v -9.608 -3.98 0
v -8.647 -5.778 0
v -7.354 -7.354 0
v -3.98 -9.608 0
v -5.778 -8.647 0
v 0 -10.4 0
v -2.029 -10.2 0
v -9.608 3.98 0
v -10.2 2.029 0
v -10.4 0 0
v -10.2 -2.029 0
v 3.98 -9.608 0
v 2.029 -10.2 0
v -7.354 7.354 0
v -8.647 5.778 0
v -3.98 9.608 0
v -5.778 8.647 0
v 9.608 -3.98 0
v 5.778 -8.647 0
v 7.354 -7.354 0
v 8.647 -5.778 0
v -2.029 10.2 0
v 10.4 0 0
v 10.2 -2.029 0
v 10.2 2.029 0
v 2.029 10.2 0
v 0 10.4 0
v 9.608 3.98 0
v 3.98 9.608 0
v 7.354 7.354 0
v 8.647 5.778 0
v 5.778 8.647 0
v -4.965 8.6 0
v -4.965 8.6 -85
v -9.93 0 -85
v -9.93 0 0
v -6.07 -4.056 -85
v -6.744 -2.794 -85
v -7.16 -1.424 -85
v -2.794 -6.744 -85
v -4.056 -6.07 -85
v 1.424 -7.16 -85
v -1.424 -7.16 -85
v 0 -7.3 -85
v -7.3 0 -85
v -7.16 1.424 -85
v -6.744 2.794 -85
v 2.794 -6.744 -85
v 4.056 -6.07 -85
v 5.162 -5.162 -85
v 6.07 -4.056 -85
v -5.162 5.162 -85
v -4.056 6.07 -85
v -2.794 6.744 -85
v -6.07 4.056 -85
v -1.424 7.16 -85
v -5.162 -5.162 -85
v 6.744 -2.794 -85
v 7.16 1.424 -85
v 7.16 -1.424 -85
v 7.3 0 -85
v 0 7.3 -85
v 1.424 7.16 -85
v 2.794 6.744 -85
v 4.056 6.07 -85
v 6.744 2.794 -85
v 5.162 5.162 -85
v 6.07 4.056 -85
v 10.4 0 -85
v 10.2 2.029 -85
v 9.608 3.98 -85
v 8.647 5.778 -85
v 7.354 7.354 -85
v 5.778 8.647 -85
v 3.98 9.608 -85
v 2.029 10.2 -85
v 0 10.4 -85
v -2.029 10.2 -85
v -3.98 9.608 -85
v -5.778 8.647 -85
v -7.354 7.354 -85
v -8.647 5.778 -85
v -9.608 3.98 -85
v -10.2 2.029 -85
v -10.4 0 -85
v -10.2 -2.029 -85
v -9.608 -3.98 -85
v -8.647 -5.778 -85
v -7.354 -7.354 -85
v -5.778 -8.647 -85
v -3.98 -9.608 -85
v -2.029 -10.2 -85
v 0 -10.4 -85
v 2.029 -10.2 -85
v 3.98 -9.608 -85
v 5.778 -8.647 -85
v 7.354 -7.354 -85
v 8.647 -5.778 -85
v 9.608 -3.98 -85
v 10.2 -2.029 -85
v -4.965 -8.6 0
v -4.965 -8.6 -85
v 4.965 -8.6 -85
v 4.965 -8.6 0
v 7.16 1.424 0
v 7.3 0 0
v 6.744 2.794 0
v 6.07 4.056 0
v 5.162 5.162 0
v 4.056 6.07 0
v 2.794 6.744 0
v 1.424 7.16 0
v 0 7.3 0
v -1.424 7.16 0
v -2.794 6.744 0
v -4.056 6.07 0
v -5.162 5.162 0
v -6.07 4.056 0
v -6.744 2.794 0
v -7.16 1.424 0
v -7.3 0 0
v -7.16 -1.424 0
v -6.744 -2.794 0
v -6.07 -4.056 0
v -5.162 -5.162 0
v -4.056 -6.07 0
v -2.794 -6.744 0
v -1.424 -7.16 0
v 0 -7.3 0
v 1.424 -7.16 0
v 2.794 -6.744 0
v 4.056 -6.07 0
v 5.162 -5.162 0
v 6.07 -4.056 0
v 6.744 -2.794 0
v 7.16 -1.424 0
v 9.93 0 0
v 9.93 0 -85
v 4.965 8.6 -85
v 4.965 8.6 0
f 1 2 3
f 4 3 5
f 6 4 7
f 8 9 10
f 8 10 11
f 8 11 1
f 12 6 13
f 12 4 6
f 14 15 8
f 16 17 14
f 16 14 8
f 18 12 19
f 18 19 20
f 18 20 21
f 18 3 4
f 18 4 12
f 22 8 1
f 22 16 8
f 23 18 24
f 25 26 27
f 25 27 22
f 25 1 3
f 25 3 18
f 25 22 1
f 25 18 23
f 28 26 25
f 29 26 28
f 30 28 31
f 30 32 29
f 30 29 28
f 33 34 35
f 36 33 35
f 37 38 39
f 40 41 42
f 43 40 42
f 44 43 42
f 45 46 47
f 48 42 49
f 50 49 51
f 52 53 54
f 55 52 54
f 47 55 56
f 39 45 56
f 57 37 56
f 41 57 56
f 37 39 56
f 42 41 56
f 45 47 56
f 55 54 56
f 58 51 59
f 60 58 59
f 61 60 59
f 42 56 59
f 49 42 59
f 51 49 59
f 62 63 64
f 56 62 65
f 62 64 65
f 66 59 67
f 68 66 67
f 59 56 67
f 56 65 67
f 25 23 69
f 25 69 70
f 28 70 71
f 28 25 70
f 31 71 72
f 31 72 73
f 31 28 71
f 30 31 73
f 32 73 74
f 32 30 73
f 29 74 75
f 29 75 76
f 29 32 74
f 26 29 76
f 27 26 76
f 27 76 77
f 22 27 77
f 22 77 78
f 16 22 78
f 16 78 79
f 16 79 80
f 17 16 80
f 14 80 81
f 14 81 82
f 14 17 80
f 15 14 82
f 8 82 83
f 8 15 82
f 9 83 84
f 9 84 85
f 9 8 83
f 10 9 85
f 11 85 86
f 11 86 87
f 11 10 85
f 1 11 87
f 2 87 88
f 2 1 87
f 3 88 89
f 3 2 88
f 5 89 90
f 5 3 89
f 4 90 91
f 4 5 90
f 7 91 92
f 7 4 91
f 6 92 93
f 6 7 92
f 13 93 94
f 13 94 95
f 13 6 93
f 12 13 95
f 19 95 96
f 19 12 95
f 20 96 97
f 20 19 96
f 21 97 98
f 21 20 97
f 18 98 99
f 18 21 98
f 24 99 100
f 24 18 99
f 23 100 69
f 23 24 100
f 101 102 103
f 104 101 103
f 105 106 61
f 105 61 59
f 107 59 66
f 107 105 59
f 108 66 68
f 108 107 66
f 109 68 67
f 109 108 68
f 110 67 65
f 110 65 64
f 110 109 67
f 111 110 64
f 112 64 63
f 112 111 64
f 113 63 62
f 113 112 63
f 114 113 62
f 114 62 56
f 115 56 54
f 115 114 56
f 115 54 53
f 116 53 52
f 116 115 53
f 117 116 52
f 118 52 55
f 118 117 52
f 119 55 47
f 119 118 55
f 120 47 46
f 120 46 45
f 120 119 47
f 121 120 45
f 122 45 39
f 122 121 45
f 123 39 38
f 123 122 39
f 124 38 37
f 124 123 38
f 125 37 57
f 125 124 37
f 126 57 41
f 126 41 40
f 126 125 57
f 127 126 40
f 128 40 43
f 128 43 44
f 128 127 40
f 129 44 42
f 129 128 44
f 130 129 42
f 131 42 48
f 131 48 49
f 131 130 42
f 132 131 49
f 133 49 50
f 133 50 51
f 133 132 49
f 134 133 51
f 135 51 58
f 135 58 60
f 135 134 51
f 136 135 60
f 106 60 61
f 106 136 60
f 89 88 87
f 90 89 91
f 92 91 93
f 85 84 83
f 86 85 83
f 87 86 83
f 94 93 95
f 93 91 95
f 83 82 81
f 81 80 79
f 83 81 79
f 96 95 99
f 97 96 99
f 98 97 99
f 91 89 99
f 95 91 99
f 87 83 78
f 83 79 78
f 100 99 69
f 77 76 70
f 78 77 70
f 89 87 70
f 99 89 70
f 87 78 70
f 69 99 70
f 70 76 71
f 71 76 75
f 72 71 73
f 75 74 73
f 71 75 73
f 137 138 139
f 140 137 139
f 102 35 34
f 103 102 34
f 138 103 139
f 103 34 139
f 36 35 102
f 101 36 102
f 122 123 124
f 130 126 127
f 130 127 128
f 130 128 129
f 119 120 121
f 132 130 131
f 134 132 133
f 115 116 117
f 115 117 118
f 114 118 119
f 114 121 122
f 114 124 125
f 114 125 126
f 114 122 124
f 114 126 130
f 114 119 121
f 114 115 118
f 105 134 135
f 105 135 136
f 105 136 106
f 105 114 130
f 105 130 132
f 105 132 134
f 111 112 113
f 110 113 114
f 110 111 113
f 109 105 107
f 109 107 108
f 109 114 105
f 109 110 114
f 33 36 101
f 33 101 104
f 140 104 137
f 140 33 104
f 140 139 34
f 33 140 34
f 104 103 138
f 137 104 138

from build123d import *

# Parameters (mm, degrees)
F4_DEPTH = 85
F1_R     = 10.4
F5_DEPTH = 85
F2_R     = 7.3
F6_DEPTH = 85


with BuildPart() as f4:
    # F0 (on Top) → F4 (new body, through all)
    with BuildSketch(Plane.XY):
        Polygon((4.965212, 8.6), (-4.965212, 8.6), (-9.930425, 0), (-4.965212, -8.6), (4.965212, -8.6), (9.930425, 0), align=None)
    extrude(amount=-F4_DEPTH)


with BuildPart() as f5:
    # F1 (on Top) → F5 (new body, through all)
    with BuildSketch(Plane.XY):
        Circle(F1_R)
    extrude(amount=-F5_DEPTH)


with BuildPart() as f6:
    # F2 (on Top) → F6 (new body, through all)
    with BuildSketch(Plane.XY):
        Circle(F2_R)
    extrude(amount=-F6_DEPTH)


solid = Compound([f4.part, f5.part, f6.part])
